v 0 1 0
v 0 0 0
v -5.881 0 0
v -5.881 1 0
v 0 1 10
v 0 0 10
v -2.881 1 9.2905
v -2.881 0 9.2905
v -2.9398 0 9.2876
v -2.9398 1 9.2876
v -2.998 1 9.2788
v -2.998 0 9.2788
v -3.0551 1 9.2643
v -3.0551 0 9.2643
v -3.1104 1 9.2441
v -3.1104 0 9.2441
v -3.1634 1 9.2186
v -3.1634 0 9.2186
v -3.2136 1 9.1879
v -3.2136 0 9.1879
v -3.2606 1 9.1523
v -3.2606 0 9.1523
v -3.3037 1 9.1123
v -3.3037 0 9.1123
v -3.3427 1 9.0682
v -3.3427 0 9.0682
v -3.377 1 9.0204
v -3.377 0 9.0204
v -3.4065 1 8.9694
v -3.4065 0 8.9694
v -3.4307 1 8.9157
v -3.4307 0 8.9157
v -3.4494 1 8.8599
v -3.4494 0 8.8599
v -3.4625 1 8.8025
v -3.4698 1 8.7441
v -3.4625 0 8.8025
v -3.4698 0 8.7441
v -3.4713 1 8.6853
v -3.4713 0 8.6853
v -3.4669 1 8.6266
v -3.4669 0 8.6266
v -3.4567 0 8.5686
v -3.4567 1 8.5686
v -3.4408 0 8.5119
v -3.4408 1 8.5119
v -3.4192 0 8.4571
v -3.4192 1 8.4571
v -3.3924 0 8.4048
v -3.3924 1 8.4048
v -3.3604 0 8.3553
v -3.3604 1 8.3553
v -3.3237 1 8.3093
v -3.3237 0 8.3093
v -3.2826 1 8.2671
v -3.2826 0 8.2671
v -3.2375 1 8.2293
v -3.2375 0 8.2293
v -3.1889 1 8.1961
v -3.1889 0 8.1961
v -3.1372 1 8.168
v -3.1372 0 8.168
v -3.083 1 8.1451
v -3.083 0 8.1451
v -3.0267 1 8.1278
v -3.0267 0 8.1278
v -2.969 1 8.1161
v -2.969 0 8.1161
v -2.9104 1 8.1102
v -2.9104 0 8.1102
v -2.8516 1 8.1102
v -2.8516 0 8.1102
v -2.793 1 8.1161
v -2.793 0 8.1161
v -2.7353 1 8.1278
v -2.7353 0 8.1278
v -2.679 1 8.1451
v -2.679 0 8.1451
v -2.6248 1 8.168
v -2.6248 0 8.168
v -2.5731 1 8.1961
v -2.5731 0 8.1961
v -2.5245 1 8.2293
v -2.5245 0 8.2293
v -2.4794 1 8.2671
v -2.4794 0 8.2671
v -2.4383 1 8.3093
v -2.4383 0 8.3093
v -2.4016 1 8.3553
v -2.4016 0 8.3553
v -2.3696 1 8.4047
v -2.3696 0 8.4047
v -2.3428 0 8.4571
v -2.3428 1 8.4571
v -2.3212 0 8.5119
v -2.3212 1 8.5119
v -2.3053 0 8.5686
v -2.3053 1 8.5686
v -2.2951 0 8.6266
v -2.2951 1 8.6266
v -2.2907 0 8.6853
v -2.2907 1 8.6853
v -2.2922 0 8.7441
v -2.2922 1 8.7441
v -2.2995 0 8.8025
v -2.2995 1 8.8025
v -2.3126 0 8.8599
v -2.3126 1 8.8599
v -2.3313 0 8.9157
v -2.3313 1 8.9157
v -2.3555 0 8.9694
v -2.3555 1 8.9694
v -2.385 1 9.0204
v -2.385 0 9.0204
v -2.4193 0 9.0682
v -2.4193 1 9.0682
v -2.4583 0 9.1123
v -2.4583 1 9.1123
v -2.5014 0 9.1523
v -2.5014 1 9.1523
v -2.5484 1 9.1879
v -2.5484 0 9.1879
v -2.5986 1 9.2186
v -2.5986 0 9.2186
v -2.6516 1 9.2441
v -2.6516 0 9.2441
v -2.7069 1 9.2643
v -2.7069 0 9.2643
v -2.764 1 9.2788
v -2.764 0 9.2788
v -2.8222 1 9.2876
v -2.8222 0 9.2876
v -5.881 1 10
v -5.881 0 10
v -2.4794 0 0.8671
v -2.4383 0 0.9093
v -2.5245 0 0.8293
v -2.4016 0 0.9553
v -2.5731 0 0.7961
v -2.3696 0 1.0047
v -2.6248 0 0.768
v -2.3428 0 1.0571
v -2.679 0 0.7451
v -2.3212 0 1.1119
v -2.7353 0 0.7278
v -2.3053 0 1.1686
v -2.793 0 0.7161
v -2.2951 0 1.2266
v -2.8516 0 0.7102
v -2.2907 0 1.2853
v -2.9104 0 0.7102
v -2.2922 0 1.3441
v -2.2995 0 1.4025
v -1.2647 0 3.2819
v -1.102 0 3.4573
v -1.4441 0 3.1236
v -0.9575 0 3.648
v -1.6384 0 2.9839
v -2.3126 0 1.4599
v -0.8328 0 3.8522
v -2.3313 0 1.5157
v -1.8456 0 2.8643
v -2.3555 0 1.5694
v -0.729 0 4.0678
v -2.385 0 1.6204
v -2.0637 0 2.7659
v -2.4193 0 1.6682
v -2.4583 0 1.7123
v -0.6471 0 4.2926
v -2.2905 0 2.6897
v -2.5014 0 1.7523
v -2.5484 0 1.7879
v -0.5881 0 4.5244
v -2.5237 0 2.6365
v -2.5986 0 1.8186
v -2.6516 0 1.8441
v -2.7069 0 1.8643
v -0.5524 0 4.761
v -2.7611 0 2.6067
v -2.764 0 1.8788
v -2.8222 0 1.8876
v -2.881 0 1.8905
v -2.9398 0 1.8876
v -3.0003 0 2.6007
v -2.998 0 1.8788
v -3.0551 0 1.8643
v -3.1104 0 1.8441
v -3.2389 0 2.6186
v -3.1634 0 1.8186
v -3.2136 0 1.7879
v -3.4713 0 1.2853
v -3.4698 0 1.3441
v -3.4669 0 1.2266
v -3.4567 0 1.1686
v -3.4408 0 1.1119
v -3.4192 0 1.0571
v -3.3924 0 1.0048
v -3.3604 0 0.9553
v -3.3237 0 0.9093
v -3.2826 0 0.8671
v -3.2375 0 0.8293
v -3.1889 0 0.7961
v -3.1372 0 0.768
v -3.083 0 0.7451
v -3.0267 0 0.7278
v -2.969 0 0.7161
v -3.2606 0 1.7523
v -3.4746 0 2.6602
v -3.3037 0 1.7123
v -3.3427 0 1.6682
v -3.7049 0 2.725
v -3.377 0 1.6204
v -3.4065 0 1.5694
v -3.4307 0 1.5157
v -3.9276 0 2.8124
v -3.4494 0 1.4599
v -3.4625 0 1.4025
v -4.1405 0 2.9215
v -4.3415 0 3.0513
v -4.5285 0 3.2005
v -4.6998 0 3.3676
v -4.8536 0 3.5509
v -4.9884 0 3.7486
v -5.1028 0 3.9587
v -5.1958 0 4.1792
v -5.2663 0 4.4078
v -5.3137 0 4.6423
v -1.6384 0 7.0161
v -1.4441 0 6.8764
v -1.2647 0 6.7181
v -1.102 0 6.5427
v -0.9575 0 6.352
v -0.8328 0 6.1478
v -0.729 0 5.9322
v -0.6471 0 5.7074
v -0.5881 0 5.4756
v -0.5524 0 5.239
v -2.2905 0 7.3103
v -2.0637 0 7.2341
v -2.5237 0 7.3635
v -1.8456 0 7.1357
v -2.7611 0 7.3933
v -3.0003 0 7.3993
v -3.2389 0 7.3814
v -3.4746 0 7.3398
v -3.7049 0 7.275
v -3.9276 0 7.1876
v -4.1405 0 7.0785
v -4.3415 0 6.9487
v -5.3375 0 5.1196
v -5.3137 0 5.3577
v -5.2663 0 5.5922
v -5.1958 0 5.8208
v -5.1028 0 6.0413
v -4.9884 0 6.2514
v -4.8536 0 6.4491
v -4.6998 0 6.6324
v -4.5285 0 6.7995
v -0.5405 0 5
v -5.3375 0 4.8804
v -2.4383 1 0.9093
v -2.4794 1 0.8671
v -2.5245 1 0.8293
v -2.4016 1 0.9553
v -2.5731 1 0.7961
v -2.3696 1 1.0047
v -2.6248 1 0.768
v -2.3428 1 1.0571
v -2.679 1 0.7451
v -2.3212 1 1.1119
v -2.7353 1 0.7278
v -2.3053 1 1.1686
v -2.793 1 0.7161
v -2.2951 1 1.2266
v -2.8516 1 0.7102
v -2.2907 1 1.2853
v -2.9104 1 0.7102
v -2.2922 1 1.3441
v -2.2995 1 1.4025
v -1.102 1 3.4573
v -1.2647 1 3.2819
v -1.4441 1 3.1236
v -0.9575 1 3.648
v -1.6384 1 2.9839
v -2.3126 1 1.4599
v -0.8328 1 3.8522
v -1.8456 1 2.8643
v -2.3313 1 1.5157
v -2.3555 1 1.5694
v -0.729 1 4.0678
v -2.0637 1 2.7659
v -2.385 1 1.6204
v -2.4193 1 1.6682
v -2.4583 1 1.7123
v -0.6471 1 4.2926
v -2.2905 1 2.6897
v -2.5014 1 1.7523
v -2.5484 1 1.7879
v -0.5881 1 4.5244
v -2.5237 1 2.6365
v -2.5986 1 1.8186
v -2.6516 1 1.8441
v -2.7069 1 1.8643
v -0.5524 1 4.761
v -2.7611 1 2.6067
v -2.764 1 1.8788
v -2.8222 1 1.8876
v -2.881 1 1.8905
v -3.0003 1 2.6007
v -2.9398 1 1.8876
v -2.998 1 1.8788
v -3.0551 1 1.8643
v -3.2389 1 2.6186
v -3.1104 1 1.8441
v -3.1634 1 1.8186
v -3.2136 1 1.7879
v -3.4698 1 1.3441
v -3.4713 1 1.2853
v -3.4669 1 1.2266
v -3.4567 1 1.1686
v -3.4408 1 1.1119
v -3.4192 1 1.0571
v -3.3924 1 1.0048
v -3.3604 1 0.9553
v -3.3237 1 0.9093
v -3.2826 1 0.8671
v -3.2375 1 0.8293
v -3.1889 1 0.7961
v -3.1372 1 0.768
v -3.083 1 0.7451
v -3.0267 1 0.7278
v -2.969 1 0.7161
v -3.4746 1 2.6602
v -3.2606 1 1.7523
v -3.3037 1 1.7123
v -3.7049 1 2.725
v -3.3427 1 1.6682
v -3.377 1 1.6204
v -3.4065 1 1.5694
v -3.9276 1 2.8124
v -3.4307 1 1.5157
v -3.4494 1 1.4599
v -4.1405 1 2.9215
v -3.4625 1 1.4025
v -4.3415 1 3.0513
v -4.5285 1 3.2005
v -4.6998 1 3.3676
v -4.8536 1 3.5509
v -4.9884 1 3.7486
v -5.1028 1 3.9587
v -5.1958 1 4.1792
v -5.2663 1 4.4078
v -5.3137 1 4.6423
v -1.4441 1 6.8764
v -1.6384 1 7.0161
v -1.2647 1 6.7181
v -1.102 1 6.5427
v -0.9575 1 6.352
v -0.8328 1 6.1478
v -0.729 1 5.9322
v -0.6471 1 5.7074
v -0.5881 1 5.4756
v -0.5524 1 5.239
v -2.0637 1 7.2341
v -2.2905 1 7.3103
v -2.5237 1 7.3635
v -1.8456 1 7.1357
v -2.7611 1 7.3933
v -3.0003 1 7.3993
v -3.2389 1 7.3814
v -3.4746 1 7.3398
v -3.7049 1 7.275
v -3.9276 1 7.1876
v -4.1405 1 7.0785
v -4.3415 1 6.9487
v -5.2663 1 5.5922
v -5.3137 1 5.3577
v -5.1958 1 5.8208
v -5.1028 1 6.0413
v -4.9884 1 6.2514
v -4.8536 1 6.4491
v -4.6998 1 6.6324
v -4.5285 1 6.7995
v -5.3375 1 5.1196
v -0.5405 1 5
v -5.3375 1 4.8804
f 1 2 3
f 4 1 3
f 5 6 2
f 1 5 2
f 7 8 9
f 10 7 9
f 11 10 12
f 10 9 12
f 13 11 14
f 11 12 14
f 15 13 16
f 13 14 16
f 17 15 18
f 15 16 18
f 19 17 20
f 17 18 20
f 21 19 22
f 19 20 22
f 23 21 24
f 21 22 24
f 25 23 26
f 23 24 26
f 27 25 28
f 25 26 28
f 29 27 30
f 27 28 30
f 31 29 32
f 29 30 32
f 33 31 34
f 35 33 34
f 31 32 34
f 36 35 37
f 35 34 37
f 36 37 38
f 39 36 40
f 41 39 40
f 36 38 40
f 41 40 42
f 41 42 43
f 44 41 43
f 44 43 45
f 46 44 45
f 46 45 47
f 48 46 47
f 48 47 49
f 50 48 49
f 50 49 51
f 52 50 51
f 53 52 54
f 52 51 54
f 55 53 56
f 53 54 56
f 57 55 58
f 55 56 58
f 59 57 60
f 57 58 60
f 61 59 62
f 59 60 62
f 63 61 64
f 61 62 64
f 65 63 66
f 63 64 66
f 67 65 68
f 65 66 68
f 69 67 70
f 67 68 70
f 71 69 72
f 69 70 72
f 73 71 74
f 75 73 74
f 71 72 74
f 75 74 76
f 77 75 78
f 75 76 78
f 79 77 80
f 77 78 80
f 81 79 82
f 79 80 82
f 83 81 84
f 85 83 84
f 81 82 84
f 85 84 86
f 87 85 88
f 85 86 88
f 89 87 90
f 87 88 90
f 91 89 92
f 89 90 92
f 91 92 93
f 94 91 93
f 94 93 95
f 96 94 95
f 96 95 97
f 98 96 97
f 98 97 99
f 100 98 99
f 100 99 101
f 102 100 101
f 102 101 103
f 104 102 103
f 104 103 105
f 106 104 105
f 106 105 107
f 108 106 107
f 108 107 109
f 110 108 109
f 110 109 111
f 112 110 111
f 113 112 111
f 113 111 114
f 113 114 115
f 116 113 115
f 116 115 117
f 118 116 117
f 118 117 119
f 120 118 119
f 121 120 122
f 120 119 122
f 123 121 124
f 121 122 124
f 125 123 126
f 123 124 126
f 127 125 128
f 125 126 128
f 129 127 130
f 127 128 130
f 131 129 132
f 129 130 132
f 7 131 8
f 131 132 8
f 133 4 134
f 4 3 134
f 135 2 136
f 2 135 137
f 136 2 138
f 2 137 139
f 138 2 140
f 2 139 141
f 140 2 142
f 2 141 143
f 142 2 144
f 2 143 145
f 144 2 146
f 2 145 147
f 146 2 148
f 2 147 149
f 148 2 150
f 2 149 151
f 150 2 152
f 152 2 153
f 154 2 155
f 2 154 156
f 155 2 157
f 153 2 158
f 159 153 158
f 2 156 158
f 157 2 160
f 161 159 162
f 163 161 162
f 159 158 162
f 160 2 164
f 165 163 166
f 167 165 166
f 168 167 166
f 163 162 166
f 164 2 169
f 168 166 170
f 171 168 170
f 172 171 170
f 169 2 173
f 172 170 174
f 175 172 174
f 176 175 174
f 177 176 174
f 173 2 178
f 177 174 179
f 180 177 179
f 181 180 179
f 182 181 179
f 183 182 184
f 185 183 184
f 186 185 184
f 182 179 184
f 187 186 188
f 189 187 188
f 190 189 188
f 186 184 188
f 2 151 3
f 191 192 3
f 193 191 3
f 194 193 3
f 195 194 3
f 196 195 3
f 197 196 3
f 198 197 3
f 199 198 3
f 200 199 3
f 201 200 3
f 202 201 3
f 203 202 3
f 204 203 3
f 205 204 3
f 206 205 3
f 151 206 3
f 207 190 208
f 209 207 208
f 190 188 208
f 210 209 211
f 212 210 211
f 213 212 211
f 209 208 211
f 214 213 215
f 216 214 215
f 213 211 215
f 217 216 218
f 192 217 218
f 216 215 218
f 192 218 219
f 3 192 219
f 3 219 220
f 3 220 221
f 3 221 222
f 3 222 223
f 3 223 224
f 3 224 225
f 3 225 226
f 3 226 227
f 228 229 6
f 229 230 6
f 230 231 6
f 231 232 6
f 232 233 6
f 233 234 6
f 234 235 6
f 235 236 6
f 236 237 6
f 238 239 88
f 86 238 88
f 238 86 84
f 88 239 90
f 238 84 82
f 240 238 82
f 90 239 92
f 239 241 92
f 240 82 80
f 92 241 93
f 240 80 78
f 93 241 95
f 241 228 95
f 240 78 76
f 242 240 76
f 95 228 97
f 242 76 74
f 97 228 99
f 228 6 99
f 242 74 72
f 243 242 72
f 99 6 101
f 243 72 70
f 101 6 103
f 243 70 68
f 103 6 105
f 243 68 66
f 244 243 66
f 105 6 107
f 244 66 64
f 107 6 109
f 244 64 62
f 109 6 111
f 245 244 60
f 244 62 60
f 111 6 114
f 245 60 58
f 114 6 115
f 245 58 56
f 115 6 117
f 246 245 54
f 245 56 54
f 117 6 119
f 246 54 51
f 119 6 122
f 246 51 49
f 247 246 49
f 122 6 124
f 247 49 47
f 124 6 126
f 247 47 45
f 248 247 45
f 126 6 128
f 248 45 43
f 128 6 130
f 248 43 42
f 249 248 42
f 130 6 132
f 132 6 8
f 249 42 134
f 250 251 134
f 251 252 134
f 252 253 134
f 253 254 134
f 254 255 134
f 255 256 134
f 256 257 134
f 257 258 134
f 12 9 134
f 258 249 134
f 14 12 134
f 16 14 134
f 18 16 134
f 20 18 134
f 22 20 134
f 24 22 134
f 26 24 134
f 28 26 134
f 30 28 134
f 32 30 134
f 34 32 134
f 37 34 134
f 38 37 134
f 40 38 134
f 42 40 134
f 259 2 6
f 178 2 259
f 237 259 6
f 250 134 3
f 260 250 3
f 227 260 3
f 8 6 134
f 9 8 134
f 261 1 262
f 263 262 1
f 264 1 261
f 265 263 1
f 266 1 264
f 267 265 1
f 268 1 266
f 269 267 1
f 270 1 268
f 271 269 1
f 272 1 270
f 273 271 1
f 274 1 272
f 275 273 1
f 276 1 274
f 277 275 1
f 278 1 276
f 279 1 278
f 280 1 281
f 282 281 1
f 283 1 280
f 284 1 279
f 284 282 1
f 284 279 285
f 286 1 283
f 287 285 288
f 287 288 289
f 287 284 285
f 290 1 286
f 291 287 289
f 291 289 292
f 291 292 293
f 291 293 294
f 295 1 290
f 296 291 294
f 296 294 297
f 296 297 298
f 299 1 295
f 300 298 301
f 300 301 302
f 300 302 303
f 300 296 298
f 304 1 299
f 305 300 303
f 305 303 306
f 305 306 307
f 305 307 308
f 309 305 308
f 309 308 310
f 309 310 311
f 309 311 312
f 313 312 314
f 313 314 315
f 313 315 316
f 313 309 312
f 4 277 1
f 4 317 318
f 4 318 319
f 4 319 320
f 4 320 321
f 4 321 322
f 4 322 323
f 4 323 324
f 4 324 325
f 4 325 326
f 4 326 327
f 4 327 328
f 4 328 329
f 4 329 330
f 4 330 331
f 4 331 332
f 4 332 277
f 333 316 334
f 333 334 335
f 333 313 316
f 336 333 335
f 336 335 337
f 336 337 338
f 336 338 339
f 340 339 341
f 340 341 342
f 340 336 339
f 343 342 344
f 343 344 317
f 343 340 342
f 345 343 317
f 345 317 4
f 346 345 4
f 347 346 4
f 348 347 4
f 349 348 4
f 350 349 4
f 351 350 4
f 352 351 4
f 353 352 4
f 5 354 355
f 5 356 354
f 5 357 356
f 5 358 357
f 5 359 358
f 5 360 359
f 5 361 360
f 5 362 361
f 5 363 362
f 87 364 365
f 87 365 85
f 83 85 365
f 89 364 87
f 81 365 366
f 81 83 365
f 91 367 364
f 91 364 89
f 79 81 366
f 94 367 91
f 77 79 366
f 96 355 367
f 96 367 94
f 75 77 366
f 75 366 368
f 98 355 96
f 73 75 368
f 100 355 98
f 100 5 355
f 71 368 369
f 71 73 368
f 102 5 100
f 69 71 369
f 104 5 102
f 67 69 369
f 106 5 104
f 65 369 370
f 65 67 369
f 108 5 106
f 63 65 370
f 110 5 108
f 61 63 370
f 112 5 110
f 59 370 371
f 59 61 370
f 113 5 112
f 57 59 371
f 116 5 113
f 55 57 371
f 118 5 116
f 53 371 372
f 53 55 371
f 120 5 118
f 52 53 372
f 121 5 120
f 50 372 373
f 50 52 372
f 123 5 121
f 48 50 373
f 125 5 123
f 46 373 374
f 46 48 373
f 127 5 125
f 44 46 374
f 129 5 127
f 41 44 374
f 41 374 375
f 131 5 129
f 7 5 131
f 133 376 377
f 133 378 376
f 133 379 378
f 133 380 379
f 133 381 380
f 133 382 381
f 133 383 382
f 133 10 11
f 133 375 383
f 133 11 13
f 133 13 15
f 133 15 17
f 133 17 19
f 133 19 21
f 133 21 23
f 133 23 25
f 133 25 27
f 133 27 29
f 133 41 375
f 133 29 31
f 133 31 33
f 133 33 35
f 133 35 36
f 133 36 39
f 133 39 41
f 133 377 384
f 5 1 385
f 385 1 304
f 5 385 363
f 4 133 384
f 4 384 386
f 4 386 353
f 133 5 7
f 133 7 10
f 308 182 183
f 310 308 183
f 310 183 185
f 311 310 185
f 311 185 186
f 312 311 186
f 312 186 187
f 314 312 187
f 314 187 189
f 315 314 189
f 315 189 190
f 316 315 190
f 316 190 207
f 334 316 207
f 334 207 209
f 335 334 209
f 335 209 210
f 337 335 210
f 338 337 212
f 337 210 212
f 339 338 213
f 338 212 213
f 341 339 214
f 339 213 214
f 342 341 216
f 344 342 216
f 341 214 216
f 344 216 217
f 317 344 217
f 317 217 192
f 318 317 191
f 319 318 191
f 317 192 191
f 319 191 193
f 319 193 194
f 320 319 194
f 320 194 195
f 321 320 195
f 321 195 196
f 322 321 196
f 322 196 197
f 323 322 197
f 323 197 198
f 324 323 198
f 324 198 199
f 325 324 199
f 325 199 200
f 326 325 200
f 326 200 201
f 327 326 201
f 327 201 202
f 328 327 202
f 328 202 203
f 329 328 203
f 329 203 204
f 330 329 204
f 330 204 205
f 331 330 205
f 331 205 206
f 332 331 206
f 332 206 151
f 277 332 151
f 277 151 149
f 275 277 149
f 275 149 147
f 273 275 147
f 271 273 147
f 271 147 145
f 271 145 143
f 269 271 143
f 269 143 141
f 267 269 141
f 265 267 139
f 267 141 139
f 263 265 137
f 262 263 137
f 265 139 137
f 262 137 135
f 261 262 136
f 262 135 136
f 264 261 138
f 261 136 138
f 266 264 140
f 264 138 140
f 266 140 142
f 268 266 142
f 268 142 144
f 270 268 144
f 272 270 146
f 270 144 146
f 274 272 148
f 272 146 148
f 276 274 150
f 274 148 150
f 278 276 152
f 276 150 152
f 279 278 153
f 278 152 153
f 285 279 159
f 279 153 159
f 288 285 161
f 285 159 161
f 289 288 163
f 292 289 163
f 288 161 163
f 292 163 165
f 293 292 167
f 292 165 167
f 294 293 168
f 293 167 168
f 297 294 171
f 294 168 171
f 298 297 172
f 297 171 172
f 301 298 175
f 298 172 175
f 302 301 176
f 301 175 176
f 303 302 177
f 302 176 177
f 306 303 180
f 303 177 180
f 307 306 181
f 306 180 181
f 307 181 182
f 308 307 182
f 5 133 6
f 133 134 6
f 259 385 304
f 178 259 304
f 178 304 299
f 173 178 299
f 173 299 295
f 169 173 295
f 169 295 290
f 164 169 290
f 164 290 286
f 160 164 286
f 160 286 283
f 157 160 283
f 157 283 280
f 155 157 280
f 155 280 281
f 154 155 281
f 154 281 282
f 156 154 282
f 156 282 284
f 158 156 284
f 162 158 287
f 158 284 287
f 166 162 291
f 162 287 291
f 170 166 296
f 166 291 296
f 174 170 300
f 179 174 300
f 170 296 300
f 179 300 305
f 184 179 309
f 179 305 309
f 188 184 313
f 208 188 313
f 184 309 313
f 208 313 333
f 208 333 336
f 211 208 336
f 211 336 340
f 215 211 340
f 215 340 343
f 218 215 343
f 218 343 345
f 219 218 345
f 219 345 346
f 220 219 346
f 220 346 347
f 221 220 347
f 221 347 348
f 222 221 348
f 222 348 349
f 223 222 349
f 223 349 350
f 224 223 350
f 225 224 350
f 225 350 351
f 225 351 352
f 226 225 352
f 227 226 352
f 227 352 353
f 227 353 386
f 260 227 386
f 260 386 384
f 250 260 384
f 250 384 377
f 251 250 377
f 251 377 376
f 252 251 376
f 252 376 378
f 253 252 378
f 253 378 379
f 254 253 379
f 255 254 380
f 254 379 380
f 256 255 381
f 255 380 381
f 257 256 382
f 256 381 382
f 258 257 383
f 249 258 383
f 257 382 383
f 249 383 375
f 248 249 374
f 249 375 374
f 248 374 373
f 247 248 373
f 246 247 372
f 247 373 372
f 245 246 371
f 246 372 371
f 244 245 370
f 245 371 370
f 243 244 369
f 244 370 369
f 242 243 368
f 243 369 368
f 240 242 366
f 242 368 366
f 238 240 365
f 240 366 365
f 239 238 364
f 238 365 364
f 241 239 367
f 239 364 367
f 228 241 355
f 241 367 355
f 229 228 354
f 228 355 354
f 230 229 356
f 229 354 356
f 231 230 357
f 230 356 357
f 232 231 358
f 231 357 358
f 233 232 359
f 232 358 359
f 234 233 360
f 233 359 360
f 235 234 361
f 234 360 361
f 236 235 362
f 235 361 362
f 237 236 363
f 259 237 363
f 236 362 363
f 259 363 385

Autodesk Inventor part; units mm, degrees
ref_plane "YZ Plane" through (0, 0, 0) normal (1, 0, 0) x (0, 1, 0)
ref_plane "XZ Plane" through (0, 0, 0) normal (0, 1, 0) x (-1, 0, 0)
ref_plane "XY Plane" through (0, 0, 0) normal (0, 0, 1) x (1, 0, 0)
sketch "Sketch2" plane through (0, 0, 0) normal (0, 1, 0) x (-1, 0, 0)
  line L0 (0, 0) -> (5.881, 0)
  line L1 (5.881, 0) -> (5.881, 10)
  line L2 (5.881, 10) -> (0, 10)
  line L3 (0, 10) -> (0, 0)
  dimension "d2" = 5.881
  dimension "d3" = 10
extrude "Extrusion2" add sketch "Sketch2" along normal blind 1
sketch "Sketch3" plane through (0, 1, 0) normal (0, 1, 0) x (1, 0, 0)
  circle A0 centre (-2.9405, -5) radius 2.4
  dimension "d6" = 4.8
extrude "Extrusion3" cut sketch "Sketch3" against normal blind 1
sketch "Sketch4" plane through (0, 1, 0) normal (0, 1, 0) x (1, 0, 0)
  circle A0 centre (-2.9405, -5) radius 2.4 projected
  line L0 (0, 0) -> (-5.881, 0) projected
  line L1 (-5.881, 0) -> (-5.881, -10) projected
  line L2 (-5.881, -10) -> (0, -10) projected
  line L3 (0, -10) -> (0, 0) projected
hole "Hole1" at (-2.881, 1, 1.3) direction (0, -1, 0) diameter 1.181 end through all thread size "0-80 UNF" class "2B" standard "ANSI Unified Screw Threads"
hole "Hole2" at (-2.881, 1, 8.7) direction (0, -1, 0) diameter 1.181 end through all thread size "0-80 UNF" class "2B" standard "ANSI Unified Screw Threads"
properties part number "recessedCoverslipHolder_v1"
